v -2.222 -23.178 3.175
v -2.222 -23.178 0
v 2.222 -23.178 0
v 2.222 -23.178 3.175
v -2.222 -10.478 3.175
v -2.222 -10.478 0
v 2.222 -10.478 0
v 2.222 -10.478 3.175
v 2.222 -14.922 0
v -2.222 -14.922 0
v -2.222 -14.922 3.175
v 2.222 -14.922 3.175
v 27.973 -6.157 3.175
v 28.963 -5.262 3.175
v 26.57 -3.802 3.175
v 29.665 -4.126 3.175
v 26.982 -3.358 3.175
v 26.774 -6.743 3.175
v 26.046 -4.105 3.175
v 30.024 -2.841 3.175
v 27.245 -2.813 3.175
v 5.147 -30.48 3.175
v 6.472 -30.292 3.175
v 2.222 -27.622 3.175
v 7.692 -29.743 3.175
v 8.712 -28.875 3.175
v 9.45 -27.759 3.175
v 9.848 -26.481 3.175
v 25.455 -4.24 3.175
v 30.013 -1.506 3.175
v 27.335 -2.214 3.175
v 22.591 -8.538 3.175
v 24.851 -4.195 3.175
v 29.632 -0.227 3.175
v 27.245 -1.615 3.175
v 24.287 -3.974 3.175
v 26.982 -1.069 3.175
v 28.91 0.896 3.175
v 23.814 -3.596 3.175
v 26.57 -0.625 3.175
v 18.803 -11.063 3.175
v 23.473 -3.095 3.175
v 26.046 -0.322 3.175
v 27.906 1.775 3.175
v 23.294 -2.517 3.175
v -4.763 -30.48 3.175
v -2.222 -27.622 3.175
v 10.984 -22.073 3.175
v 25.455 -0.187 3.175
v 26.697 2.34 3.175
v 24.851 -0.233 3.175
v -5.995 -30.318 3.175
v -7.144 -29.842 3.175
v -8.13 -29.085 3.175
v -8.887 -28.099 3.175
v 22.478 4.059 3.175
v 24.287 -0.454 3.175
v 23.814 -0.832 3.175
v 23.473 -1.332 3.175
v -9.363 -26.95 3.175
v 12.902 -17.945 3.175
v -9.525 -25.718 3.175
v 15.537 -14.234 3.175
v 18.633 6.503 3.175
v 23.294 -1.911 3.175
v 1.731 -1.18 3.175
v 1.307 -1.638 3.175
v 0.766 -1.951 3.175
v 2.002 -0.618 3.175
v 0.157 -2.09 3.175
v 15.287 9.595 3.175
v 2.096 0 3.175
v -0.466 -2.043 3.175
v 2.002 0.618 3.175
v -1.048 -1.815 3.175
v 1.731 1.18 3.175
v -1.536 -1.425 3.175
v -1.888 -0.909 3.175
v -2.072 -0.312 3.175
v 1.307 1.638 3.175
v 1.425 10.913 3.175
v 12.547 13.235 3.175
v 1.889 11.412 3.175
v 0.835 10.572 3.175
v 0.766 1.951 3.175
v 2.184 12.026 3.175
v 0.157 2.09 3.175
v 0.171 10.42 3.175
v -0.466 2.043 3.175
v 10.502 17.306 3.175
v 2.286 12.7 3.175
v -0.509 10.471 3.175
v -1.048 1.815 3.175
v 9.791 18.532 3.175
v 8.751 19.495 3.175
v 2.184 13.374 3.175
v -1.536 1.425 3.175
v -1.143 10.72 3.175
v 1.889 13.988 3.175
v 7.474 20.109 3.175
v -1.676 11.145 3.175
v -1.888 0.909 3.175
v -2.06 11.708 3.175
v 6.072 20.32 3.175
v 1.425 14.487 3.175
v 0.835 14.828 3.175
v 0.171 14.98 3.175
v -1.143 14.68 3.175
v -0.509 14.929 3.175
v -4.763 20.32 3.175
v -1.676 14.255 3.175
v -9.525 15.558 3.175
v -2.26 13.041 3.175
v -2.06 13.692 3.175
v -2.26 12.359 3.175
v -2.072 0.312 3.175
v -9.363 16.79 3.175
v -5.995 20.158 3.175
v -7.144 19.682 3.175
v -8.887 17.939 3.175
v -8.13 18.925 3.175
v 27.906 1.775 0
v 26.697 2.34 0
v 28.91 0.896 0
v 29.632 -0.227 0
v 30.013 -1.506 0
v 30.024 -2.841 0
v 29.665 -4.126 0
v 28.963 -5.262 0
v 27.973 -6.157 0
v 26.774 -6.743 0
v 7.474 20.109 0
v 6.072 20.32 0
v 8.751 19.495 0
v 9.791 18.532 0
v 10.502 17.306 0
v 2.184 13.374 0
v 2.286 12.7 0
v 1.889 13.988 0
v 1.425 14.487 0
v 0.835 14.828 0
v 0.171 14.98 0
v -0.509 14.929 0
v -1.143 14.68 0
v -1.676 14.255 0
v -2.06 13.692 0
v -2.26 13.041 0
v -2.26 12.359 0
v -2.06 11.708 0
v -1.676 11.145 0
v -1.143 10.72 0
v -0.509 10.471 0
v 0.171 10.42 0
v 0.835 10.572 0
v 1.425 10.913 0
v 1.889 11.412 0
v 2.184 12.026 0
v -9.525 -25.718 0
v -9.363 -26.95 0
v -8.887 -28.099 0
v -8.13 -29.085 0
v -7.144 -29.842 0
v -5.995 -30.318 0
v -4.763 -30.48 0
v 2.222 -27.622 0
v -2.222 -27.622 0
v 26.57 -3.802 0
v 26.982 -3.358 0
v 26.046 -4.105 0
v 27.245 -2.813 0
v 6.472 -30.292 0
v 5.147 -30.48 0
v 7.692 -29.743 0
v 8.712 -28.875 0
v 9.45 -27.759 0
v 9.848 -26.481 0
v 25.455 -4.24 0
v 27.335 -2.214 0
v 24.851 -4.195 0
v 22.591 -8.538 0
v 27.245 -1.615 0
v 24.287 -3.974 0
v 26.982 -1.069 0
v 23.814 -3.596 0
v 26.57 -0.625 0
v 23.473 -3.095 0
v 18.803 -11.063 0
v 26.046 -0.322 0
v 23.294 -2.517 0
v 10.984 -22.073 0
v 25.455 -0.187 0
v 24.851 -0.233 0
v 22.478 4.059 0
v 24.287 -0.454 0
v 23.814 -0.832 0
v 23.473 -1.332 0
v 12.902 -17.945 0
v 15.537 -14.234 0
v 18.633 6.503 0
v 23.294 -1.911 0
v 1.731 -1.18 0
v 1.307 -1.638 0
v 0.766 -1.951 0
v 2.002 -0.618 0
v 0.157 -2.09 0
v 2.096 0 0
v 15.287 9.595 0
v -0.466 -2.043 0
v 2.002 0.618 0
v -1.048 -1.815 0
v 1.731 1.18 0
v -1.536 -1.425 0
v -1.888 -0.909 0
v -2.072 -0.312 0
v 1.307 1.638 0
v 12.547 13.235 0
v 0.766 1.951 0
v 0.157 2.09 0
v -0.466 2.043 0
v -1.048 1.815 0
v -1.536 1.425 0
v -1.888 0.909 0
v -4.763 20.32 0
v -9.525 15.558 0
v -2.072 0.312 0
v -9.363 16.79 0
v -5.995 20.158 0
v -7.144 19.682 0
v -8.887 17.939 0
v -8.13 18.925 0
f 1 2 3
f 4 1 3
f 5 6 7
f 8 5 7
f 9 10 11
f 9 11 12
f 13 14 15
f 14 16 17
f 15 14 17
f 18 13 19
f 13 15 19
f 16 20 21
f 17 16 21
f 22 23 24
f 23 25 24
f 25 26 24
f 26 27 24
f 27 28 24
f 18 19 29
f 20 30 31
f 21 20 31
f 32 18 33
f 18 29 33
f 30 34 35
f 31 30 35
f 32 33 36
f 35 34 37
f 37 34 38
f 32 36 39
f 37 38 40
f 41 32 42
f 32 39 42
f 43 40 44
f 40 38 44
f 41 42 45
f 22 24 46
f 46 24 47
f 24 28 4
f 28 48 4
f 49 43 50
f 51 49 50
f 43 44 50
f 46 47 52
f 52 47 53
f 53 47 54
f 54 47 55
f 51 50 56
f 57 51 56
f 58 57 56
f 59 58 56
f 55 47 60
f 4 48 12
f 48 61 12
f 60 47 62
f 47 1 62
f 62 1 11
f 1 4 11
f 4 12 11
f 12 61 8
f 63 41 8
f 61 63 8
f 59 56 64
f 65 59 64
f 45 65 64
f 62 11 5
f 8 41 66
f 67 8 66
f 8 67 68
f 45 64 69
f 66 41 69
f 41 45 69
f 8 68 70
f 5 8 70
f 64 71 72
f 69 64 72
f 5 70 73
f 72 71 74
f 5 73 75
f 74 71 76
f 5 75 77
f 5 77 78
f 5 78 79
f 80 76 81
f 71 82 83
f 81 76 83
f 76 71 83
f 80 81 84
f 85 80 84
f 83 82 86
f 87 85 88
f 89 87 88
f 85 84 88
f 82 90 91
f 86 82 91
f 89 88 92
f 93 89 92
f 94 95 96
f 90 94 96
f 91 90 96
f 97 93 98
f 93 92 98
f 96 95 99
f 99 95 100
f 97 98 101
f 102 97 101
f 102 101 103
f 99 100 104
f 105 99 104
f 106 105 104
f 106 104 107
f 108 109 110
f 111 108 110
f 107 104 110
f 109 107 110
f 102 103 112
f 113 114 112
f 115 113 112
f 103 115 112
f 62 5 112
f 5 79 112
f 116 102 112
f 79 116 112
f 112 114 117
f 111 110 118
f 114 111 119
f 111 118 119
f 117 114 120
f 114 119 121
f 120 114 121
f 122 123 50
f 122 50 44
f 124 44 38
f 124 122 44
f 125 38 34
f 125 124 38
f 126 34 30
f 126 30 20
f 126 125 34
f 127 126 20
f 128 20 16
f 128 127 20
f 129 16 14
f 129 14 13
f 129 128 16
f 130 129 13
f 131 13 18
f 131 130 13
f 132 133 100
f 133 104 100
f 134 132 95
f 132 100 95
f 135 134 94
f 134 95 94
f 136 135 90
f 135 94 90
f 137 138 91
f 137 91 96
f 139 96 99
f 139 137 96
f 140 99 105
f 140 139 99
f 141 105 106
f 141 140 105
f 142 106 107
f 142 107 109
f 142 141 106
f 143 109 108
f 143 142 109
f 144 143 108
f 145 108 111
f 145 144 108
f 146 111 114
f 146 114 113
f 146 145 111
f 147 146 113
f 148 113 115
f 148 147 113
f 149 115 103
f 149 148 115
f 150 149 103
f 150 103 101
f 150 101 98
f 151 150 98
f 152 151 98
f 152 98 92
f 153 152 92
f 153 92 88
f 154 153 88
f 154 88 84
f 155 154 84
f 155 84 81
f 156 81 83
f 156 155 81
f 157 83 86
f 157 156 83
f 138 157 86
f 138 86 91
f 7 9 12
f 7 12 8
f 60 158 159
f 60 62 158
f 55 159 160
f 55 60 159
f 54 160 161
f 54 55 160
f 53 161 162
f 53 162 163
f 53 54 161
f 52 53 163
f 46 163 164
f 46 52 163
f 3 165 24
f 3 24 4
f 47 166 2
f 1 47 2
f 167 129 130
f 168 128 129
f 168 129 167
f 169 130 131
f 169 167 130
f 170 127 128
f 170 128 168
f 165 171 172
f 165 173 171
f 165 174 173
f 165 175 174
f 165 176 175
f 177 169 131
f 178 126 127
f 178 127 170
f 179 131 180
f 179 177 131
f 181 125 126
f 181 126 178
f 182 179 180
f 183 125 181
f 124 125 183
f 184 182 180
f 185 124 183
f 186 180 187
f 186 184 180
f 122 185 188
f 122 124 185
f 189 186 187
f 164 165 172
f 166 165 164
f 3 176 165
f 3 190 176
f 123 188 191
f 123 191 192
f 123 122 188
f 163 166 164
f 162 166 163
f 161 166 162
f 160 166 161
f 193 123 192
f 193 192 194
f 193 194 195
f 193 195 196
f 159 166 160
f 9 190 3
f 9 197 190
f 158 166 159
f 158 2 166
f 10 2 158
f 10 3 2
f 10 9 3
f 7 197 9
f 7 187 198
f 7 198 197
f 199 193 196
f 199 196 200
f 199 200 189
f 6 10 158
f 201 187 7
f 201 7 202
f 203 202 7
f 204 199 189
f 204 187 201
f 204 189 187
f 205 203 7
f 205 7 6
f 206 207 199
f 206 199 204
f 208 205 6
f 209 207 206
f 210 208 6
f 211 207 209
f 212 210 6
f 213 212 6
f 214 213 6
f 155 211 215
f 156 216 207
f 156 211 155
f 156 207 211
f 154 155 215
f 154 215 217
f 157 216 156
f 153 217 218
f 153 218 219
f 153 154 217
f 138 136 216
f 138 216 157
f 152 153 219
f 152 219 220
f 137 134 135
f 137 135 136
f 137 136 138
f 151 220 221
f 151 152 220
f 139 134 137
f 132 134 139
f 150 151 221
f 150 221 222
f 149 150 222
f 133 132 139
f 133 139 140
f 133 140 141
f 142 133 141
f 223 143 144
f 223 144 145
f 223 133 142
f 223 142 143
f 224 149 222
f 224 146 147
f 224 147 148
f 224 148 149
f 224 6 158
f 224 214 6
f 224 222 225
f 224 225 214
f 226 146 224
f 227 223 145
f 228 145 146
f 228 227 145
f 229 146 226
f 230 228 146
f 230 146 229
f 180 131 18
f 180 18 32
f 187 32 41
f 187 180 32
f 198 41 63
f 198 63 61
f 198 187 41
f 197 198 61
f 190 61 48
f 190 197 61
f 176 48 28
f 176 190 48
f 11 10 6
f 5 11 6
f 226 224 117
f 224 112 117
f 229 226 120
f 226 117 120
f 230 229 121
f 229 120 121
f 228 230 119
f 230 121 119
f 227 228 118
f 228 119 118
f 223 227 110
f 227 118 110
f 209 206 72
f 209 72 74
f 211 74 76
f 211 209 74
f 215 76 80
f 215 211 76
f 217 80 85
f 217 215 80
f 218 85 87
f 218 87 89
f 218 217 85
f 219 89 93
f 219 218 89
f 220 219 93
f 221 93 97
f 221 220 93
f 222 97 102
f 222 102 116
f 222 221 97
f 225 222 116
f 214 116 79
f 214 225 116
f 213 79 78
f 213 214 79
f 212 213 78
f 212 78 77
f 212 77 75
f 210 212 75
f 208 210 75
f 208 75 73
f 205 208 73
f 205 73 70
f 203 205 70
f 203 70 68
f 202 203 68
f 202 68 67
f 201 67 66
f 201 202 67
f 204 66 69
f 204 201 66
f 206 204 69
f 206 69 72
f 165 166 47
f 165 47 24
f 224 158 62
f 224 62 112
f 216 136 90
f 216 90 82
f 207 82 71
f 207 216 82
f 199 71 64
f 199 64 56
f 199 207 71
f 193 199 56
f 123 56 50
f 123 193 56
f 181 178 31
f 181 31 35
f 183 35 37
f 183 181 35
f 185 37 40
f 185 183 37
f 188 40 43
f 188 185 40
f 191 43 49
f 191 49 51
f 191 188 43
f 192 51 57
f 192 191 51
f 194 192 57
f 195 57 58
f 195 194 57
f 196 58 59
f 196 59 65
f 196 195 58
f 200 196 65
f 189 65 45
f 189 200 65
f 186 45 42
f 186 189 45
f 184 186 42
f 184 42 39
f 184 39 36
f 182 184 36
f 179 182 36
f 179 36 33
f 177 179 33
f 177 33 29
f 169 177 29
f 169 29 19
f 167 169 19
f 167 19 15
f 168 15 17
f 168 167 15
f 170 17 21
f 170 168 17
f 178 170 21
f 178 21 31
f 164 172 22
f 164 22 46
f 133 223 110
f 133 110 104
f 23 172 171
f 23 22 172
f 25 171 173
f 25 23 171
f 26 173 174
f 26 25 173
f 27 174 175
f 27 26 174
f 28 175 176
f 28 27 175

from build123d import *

# Parameters (mm, degrees)
SKETCH1_R           = 2.032
SKETCH1_R_2         = 2.286
SKETCH1_R_3         = 2.0955
SKETCH1_W           = 4.445
SKETCH1_H           = 4.445
BOSS_EXTRUDE1_DEPTH = 3.175
FILLET1_R           = 4.7625


with BuildPart() as part:
    # Sketch1 → Boss-Extrude1 (new body)
    with BuildSketch(Plane.XY):
        with BuildLine():
            Line((-9.525, -30.48), (-9.525, 20.32))
            Line((-9.525, 20.32), (9.525, 20.32))
            ThreePointArc((9.525, 20.32), (15.760681597, 9.08548638), (26.69688421, 2.340303383))
            ThreePointArc((26.69688421, 2.340303383), (30.065673036, -2.173245584), (26.774154282, -6.743449816))
            ThreePointArc((26.774154282, -6.743449816), (14.292700247, -15.808964436), (9.525, -30.48))
            Line((9.525, -30.48), (-9.525, -30.48))
        make_face()
        with Locations((25.303345332, -2.213755866)):
            Circle(SKETCH1_R, mode=Mode.SUBTRACT)
        with Locations((0, 12.7)):
            Circle(SKETCH1_R_2, mode=Mode.SUBTRACT)
        Circle(SKETCH1_R_3, mode=Mode.SUBTRACT)
        with Locations((0, -25.4)):
            Rectangle(SKETCH1_W, SKETCH1_H, mode=Mode.SUBTRACT)
        with Locations((0, -12.7)):
            Rectangle(SKETCH1_W, SKETCH1_H, mode=Mode.SUBTRACT)
    extrude(amount=BOSS_EXTRUDE1_DEPTH)

    # Fillet1
    fillet1_edges = [part.edges().sort_by_distance(p)[0] for p in [
        (-9.525, -30.48, 1.5875),
        (-9.525, 20.32, 1.5875),
        (9.525, 20.32, 1.5875),
        (9.525, -30.48, 1.5875),
    ]]
    fillet(fillet1_edges, radius=FILLET1_R)


solid = part.part
